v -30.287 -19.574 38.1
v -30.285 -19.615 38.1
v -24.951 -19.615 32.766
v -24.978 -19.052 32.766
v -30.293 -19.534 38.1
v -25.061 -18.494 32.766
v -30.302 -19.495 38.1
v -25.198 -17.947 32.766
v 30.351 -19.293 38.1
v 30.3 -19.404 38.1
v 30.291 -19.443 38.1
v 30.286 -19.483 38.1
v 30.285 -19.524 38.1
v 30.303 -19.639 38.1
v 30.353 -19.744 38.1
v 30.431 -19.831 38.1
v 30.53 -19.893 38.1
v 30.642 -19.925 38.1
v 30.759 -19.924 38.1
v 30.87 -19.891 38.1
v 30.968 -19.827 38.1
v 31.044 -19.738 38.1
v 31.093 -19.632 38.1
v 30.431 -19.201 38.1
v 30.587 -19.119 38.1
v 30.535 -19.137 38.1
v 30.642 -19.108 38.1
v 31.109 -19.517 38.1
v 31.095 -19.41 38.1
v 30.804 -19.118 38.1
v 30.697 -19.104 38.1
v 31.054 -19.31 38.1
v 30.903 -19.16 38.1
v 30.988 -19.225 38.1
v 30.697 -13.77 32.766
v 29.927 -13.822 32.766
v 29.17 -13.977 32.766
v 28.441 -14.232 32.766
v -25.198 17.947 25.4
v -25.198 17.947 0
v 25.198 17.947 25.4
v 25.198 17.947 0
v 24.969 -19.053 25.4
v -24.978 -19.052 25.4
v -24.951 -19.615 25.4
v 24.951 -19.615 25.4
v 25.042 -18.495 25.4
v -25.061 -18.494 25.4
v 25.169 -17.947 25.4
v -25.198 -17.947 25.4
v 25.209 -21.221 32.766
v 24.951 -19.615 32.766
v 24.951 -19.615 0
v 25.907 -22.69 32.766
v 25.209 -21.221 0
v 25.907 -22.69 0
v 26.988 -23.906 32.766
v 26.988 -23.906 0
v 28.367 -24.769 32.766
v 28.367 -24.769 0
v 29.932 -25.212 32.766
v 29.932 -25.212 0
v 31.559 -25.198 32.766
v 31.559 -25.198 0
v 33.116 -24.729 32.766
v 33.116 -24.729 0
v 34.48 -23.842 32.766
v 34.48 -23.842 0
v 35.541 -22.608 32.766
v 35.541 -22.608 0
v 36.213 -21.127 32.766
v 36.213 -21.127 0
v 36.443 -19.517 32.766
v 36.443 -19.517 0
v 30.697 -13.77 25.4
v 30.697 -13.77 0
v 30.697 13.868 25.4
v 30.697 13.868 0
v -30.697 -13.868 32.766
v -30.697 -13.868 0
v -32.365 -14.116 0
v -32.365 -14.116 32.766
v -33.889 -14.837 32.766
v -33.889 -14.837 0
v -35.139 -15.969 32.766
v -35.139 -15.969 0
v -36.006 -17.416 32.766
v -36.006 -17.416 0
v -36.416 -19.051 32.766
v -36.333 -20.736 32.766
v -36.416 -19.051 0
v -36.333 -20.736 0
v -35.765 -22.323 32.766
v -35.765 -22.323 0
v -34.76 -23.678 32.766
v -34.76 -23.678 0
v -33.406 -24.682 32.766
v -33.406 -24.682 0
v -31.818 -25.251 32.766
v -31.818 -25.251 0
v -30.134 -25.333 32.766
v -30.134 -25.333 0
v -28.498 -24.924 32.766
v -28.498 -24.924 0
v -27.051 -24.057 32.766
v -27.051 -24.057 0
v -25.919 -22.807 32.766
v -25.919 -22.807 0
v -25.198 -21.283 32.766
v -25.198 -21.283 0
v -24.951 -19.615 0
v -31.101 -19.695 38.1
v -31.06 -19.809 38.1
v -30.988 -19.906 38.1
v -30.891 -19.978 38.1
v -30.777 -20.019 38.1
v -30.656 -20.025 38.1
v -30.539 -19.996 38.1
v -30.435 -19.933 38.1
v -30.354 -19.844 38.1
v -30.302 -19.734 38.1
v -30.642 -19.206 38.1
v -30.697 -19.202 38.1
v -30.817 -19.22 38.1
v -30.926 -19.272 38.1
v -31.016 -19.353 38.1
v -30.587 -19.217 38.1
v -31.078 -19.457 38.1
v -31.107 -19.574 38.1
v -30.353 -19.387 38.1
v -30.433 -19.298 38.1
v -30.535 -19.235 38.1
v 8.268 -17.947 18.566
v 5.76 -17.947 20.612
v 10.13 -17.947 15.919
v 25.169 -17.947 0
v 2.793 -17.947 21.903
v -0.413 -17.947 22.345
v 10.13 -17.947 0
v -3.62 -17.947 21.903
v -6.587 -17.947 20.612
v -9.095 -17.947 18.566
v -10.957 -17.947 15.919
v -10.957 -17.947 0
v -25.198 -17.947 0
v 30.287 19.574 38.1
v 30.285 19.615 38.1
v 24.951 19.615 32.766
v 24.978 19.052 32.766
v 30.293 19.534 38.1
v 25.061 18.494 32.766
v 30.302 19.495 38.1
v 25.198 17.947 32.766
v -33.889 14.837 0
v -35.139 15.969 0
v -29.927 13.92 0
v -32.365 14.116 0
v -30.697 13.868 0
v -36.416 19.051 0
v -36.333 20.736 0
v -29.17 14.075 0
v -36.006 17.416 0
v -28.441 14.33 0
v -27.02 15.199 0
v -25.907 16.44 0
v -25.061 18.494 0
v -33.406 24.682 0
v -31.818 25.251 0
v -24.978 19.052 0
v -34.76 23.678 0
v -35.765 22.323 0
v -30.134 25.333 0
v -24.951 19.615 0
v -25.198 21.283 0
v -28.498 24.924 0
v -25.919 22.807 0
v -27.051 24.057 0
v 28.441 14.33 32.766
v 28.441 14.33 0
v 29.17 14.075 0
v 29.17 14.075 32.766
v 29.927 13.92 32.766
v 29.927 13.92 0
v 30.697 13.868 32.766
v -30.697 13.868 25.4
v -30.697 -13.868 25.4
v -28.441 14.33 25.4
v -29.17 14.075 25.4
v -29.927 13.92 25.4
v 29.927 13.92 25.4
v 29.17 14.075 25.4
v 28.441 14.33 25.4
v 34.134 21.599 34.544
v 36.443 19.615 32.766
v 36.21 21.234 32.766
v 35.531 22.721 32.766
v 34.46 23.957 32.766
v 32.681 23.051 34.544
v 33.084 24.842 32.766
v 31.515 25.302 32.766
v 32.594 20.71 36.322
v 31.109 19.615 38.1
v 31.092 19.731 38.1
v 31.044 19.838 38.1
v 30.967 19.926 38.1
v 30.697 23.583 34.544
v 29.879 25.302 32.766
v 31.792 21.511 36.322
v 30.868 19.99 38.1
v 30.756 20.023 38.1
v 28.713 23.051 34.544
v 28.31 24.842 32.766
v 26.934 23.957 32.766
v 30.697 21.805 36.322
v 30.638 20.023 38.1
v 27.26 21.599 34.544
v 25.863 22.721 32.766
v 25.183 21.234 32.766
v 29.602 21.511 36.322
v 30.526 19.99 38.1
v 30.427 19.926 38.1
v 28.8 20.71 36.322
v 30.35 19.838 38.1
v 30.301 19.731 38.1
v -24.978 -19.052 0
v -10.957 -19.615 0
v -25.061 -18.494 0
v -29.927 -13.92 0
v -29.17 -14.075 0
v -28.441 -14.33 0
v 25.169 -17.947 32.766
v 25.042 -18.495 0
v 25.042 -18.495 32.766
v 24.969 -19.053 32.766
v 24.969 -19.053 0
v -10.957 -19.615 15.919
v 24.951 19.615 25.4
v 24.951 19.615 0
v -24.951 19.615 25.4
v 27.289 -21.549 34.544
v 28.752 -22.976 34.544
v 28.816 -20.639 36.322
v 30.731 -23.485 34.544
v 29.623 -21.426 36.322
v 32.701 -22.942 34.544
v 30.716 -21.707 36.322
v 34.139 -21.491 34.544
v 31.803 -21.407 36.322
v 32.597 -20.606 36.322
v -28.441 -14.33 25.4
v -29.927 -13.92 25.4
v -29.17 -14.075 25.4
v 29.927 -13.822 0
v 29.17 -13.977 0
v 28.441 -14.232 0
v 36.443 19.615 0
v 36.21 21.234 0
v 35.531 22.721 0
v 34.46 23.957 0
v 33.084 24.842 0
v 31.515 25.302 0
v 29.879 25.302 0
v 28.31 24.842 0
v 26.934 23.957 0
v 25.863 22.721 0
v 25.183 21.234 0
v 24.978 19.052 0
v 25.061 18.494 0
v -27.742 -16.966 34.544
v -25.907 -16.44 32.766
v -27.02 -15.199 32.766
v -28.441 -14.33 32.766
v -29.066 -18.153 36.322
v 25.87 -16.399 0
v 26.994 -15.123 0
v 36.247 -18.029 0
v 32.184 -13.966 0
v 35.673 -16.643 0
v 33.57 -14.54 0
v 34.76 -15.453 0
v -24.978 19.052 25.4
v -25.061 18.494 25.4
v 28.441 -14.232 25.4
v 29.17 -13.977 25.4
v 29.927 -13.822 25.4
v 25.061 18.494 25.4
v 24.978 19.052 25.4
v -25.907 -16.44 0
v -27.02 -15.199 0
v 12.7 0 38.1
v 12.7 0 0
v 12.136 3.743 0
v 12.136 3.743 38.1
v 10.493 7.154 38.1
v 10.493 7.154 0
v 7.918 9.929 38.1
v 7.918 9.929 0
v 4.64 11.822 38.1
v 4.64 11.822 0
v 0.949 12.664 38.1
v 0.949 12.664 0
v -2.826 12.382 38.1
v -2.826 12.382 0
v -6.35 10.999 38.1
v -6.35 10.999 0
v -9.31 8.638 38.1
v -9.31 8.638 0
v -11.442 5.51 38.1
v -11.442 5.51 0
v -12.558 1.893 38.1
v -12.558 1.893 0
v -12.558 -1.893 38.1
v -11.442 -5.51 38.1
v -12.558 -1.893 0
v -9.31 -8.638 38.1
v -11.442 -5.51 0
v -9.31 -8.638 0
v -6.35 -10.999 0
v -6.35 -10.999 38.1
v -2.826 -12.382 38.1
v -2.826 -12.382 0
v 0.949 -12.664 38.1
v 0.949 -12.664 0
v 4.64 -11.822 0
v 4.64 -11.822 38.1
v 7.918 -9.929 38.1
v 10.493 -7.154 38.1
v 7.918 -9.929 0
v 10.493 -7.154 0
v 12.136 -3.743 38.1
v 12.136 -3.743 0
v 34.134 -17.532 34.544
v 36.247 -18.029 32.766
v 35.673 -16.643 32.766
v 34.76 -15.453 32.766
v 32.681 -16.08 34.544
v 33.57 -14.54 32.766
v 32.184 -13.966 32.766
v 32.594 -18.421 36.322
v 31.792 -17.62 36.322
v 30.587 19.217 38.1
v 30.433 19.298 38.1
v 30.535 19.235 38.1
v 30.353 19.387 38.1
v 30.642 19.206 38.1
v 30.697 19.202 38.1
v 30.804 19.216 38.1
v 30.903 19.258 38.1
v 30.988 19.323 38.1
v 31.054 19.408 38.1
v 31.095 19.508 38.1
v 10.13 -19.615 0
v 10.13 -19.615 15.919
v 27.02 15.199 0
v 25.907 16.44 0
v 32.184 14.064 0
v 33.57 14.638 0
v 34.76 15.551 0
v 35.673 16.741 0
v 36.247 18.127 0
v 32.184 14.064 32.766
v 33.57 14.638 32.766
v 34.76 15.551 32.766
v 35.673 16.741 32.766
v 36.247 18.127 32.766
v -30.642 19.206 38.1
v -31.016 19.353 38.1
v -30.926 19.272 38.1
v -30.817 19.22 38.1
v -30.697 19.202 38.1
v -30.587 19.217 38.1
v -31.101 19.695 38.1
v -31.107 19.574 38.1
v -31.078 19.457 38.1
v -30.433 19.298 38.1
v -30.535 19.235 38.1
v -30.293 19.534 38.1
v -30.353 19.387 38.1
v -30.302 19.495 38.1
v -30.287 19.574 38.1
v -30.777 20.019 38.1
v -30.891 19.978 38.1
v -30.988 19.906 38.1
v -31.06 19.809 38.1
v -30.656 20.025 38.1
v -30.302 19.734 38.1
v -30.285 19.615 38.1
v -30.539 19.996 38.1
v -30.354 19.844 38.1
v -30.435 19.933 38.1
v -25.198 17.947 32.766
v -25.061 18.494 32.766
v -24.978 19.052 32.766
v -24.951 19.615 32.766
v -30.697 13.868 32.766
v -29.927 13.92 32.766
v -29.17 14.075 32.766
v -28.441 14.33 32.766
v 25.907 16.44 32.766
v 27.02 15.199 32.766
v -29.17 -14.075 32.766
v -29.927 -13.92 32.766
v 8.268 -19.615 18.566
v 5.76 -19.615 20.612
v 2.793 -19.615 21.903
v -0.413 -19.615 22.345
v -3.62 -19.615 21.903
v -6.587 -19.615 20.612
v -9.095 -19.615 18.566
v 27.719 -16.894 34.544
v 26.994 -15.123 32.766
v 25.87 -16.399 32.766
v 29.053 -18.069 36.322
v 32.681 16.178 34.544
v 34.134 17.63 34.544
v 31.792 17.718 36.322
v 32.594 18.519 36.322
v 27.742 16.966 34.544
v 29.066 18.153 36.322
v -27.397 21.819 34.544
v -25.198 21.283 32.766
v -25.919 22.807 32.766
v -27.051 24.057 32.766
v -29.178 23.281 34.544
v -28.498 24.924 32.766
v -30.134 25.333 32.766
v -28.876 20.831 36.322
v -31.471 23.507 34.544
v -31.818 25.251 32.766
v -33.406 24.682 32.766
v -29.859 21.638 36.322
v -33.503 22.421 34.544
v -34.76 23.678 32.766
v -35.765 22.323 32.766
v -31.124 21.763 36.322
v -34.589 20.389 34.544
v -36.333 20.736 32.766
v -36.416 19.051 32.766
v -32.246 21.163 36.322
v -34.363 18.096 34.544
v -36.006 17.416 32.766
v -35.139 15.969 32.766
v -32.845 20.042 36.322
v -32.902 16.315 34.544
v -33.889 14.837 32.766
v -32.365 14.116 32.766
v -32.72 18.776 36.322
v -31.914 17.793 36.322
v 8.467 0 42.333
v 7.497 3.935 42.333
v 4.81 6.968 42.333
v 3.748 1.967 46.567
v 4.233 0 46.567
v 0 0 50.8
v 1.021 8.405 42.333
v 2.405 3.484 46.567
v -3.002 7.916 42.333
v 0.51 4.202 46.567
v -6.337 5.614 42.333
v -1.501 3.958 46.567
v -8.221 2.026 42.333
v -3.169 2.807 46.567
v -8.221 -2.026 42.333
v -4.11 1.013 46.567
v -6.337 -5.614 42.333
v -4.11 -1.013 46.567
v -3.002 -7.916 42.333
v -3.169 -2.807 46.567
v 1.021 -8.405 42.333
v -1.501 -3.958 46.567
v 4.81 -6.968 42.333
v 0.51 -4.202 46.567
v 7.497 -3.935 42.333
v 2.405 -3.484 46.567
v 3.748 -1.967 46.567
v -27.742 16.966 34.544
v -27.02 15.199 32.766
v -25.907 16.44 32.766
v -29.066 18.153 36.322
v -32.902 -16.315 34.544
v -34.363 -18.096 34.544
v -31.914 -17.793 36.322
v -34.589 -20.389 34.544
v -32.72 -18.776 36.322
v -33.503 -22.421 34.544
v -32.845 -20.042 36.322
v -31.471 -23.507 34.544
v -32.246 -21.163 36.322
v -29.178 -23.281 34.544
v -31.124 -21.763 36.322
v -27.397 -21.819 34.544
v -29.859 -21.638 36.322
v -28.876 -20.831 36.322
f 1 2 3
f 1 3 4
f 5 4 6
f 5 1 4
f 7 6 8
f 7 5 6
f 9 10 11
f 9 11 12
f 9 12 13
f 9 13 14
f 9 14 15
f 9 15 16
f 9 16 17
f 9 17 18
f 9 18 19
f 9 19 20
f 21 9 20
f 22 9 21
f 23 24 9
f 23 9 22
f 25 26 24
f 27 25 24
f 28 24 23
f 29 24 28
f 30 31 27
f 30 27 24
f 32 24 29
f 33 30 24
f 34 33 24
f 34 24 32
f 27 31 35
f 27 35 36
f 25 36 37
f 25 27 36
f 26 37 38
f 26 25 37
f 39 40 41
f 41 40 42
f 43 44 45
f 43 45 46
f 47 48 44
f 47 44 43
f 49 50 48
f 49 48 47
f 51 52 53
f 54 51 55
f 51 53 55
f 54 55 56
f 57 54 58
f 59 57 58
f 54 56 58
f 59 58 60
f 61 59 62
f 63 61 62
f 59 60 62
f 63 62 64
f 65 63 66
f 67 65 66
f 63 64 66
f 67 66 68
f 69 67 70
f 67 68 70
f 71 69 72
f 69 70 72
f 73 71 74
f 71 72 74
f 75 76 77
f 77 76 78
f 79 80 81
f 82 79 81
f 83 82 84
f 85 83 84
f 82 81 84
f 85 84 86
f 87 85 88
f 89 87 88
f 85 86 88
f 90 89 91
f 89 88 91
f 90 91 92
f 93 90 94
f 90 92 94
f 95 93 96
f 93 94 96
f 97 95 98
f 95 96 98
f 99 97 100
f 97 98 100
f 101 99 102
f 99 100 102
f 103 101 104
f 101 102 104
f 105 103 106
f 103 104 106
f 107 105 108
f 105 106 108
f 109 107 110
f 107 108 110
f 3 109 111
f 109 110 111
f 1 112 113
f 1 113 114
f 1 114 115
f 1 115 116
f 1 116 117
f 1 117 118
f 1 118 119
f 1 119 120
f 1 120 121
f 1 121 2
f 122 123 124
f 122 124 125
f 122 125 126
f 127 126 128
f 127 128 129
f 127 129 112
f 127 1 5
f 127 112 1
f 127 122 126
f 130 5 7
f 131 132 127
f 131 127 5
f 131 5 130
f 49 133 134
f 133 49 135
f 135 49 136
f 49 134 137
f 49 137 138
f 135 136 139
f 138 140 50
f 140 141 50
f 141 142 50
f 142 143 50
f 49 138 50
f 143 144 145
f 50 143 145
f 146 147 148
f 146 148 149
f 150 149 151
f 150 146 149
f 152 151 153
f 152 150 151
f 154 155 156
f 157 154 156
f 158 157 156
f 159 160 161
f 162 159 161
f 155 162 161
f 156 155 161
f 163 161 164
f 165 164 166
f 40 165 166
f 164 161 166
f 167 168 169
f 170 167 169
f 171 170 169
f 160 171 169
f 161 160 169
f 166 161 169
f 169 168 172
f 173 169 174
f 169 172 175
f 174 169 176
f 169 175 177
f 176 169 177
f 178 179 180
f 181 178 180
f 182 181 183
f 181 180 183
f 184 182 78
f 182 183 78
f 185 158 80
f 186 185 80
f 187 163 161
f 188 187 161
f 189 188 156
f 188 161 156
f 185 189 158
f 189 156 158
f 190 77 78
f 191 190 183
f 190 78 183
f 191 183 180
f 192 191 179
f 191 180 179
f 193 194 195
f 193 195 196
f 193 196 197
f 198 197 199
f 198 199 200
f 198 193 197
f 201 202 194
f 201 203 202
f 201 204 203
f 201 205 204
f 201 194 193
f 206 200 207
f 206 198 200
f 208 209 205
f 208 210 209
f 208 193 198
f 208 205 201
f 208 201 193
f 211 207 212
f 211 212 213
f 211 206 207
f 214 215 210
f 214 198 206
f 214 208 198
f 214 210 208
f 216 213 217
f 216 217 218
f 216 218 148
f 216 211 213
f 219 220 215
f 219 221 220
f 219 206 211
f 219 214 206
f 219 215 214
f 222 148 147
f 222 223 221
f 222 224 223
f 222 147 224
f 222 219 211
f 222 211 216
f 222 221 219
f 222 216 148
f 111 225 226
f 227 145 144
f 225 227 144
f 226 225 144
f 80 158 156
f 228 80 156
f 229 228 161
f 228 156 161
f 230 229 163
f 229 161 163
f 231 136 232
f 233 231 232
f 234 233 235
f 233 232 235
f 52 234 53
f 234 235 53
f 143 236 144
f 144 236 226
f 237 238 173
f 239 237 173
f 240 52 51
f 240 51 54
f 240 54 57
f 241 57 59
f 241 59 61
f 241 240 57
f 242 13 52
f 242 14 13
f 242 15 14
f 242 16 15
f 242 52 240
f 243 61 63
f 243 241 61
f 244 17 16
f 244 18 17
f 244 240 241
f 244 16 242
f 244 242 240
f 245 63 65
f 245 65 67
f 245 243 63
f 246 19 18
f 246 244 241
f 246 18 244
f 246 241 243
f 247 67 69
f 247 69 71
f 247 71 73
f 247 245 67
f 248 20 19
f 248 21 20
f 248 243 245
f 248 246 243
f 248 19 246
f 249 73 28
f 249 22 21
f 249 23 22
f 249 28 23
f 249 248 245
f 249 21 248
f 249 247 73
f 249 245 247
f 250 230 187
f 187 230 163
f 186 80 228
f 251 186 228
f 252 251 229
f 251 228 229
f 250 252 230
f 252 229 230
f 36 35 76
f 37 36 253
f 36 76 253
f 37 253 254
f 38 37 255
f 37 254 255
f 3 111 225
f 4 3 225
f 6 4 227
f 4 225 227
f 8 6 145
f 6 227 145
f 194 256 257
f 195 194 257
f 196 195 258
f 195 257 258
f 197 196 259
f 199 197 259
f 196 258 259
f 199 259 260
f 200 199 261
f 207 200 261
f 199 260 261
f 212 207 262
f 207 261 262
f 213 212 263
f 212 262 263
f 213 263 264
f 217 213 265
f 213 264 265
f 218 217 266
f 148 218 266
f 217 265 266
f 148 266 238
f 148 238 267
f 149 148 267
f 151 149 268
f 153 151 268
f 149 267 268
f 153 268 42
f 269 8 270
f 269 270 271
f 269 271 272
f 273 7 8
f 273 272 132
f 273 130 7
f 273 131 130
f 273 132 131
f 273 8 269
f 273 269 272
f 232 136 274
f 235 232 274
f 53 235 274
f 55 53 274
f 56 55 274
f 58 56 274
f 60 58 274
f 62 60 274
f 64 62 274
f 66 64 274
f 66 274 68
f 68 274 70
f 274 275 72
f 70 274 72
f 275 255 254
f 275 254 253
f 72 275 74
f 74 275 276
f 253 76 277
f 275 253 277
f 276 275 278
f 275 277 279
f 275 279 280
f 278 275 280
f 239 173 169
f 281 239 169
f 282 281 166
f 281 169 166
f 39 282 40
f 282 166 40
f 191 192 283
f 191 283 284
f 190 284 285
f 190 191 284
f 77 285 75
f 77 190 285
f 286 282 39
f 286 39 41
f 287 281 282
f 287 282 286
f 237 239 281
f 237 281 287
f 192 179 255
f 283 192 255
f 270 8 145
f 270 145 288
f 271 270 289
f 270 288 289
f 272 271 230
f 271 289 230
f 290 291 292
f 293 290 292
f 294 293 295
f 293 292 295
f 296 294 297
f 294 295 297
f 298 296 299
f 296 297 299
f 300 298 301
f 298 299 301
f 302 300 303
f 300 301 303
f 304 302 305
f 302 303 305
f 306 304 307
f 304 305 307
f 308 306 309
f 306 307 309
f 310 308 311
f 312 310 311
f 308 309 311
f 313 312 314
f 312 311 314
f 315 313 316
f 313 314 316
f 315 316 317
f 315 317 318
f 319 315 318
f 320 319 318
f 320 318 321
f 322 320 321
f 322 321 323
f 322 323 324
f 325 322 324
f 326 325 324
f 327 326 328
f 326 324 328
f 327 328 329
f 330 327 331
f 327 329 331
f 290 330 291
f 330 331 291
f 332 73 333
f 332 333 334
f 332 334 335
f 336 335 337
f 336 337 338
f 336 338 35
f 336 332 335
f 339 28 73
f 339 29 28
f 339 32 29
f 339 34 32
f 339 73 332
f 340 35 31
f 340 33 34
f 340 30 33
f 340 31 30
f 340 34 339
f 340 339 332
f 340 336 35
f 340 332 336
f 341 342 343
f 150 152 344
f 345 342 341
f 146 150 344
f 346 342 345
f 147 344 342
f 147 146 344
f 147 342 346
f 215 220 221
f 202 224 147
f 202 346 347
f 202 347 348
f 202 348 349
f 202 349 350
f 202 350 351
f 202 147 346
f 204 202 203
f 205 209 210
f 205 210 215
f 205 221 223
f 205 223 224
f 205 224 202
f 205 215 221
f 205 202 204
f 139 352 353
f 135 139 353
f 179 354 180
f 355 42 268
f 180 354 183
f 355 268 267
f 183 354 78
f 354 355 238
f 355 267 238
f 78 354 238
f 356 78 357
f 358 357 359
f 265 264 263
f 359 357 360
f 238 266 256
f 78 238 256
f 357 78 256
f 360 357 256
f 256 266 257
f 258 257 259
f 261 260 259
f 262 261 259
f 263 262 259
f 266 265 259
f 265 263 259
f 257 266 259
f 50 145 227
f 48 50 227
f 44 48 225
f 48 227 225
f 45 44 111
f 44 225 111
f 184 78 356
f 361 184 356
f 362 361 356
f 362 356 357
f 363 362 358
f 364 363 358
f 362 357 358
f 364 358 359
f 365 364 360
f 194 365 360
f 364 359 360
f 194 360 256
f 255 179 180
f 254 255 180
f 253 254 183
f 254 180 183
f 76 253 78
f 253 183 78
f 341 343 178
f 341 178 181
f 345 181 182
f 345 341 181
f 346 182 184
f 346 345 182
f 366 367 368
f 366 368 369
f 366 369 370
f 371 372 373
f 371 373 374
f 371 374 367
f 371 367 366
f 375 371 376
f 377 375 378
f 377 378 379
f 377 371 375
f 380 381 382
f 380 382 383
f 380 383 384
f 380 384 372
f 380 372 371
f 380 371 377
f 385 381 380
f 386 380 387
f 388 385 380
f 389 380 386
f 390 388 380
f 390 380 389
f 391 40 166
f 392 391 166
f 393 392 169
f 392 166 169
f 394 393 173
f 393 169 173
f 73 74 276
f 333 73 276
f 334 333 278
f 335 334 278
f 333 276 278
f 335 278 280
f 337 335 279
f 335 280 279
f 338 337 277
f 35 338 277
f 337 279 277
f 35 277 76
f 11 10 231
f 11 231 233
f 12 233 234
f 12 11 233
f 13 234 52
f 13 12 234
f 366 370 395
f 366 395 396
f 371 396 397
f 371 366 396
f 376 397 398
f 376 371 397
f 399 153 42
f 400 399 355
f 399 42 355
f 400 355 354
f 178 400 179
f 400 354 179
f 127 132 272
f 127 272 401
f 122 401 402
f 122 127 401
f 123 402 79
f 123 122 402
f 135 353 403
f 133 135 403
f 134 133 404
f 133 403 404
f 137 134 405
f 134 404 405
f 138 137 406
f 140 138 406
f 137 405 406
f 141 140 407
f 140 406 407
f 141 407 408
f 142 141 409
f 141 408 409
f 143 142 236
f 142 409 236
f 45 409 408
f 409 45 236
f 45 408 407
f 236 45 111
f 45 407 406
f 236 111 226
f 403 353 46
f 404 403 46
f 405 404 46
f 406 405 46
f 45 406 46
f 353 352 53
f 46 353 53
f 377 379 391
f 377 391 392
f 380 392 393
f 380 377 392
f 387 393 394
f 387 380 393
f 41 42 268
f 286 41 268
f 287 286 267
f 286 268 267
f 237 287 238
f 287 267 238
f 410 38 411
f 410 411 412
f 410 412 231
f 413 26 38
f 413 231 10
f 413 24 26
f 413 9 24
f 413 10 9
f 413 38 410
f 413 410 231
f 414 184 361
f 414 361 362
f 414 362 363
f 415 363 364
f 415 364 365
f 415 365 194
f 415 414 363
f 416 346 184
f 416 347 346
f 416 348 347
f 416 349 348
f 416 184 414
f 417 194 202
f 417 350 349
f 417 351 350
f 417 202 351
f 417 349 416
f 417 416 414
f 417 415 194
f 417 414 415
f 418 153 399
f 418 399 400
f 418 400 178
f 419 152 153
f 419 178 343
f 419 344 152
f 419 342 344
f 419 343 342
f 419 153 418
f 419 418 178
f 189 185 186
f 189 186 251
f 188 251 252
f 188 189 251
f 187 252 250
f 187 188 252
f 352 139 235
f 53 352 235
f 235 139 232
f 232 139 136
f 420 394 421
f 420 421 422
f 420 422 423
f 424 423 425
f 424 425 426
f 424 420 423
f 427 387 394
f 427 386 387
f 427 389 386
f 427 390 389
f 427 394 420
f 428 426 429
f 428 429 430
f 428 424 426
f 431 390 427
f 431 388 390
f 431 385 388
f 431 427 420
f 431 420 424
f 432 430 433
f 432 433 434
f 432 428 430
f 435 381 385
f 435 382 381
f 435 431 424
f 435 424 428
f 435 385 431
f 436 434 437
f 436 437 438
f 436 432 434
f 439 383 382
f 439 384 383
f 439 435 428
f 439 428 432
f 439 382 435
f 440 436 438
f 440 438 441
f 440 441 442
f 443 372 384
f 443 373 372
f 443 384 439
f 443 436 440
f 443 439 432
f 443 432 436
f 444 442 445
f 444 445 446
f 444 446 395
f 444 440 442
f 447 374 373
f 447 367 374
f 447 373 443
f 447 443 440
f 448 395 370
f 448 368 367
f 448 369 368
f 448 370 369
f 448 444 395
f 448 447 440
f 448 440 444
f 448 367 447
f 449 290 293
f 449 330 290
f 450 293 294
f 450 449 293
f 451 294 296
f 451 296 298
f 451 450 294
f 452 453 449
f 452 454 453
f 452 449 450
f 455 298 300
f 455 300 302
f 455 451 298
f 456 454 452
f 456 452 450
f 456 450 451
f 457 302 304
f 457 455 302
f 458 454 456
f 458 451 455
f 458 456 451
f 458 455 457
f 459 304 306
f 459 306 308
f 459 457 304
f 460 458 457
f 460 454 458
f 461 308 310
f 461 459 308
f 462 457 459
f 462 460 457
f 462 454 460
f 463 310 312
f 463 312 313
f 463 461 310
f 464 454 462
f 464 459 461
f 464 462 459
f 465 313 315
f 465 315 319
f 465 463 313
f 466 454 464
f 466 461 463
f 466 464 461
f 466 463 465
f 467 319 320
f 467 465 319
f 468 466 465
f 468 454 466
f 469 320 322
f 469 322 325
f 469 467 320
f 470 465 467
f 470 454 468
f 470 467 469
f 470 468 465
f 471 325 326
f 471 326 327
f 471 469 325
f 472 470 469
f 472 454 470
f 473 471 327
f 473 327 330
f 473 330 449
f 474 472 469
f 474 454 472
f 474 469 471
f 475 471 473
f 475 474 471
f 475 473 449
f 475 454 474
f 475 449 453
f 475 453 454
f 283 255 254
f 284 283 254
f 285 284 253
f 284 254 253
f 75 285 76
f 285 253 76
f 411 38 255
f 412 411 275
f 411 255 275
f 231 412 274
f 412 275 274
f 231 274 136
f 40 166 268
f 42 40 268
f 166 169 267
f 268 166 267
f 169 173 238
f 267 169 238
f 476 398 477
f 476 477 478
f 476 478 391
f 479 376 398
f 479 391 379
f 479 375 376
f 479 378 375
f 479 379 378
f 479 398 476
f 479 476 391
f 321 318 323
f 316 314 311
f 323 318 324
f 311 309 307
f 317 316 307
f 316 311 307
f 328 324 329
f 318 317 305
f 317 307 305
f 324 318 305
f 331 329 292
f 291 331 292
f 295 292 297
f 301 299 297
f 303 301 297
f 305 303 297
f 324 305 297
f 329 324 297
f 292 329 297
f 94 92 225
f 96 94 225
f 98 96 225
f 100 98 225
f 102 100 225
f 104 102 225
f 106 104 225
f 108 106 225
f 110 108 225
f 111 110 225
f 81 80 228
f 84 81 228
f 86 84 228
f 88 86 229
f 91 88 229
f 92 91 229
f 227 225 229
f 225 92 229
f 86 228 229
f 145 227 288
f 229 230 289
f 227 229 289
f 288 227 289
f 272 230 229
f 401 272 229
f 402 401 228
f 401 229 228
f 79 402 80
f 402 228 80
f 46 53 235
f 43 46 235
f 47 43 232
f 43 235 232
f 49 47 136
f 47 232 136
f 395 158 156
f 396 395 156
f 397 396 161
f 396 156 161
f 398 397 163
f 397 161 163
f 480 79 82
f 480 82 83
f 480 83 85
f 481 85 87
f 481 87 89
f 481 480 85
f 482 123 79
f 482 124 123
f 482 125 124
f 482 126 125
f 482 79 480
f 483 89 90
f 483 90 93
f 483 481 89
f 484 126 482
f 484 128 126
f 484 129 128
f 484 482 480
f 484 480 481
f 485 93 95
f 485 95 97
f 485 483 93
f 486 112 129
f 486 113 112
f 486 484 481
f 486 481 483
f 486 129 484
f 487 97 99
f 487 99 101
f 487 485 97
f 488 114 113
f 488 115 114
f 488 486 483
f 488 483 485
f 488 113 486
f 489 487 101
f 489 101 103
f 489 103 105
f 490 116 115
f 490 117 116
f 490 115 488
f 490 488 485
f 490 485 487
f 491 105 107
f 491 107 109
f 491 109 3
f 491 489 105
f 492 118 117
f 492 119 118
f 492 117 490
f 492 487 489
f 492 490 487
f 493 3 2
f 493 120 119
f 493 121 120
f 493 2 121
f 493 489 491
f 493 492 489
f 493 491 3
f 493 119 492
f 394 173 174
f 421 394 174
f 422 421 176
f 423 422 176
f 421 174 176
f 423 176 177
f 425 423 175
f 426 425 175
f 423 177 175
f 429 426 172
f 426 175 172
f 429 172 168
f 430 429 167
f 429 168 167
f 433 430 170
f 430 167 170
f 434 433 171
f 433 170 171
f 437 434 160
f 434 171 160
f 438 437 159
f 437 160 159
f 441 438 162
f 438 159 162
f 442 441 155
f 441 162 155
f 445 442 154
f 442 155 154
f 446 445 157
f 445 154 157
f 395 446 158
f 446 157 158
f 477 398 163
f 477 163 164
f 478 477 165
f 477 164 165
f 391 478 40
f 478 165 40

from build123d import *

# Parameters (mm, degrees)
F1_DEPTH  = 25.4
F2_DEPTH  = 38.1
F0_R      = 12.7
F3_DEPTH  = 50.8
F5_DEPTH  = 25.4
F6_SIZE   = 12.7
F7_SIZE   = 5.334
F7_2_SIZE = 5.334
F7_3_SIZE = 5.334
F7_4_SIZE = 5.334


# Not quite as in the source:
# - a feature names something its author has since deleted; it is built from what else it names


with BuildPart() as f1:
    # F0 (on Top) → F1 (new body)
    with BuildSketch(Plane.XY):
        with BuildLine():
            Line((24.9506174104, 19.6146306736), (-24.950613876, 19.6146306736))
            ThreePointArc((-24.950613876, 19.6146306736), (-25.0127463025, 18.7718966911), (-25.1977999521, 17.9473870487))
            Line((-25.1977999521, 17.9473870487), (25.1978040222, 17.9473870487))
            ThreePointArc((25.1978040222, 17.9473870487), (25.0127501018, 18.771896671), (24.9506174104, 19.6146306736))
        make_face()
    extrude(amount=F1_DEPTH)


with BuildPart() as f1b:
    # F0 (on Top) → F1, piece 2 (new body)
    with BuildSketch(Plane.XY):
        with BuildLine():
            Line((-30.6968968099, 13.8683477398), (-30.6968968099, -13.8683477398))
            ThreePointArc((-30.6968968099, -13.8683477398), (-29.54571818, -13.9848389086), (-28.4412139466, -14.3295892948))
            Line((-28.4412139466, -14.3295892948), (-28.4412139466, 14.3295892948))
            ThreePointArc((-28.4412139466, 14.3295892948), (-29.54571818, 13.9848389086), (-30.6968968099, 13.8683477398))
        make_face()
    extrude(amount=F1_DEPTH)


with BuildPart() as f1c:
    # F0 (on Top) → F1, piece 3 (new body)
    with BuildSketch(Plane.XY):
        with BuildLine():
            ThreePointArc((-25.1977999521, -17.9473870487), (-25.0127463025, -18.7718966911), (-24.950613876, -19.6146306736))
            Line((-24.950613876, -19.6146306736), (24.9514508717, -19.6146306736))
            ThreePointArc((24.9514508717, -19.6146306736), (24.9989231754, -18.7730083224), (25.1690152512, -17.9473870487))
            Line((25.1690152512, -17.9473870487), (-25.1977999521, -17.9473870487))
        make_face()
    extrude(amount=F1_DEPTH)

    # F4 (on face) → F5 (cut)
    with BuildSketch(Plane.XZ.offset(19.6146306736)):
        with BuildLine():
            Line((-10.9574375674, 15.9193035215), (-10.9574375674, 0))
            Line((-10.9574375674, 0), (10.130468756, 0))
            Line((10.130468756, 0), (10.130468756, 15.9193035215))
            ThreePointArc((10.130468756, 15.9193035215), (-0.4134844057, 22.3445965305), (-10.9574375674, 15.9193035215))
        make_face()
    extrude(amount=-F5_DEPTH, mode=Mode.SUBTRACT)


with BuildPart() as f1d:
    # F0 (on Top) → F1, piece 4 (new body)
    with BuildSketch(Plane.XY):
        with BuildLine():
            Line((28.4412139466, 14.3295925704), (28.4412139466, -14.2315152048))
            ThreePointArc((28.4412139466, -14.2315152048), (29.54571818, -13.8867648186), (30.6968968099, -13.7702736498))
            Line((30.6968968099, -13.7702736498), (30.6968968099, 13.868349507))
            ThreePointArc((30.6968968099, 13.868349507), (29.5457181005, 13.9848414147), (28.4412139466, 14.3295925704))
        make_face()
    extrude(amount=F1_DEPTH)


with BuildPart() as f2:
    # F0 (on Top) → F2 (new body)
    with BuildSketch(Plane.XY):
        with BuildLine():
            ThreePointArc((-24.950613876, 19.6146306736), (-34.760132439, 23.6778663028), (-30.6968968099, 13.8683477398))
            ThreePointArc((-30.6968968099, 13.8683477398), (-29.54571818, 13.9848389086), (-28.4412139466, 14.3295892948))
            ThreePointArc((-28.4412139466, 14.3295892948), (-26.4183144188, 15.778812602), (-25.1977999521, 17.9473870487))
            ThreePointArc((-25.1977999521, 17.9473870487), (-25.0127463025, 18.7718966911), (-24.950613876, 19.6146306736))
        make_face()
    extrude(amount=F2_DEPTH)

    # F7
    f7_edges = [f2.edges().sort_by_distance(p)[0] for p in [
        (-30.696897, 25.360914, 38.1),
    ]]
    chamfer(f7_edges, length=F7_SIZE)


with BuildPart() as f2b:
    # F0 (on Top) → F2, piece 2 (new body)
    with BuildSketch(Plane.XY):
        with BuildLine():
            ThreePointArc((25.1978040222, 17.9473870487), (26.4183172869, 15.7788151124), (28.4412139466, 14.3295925704))
            ThreePointArc((28.4412139466, 14.3295925704), (29.5457181005, 13.9848414147), (30.6968968099, 13.868349507))
            ThreePointArc((30.6968968099, 13.868349507), (34.7601347238, 15.5513955621), (36.4431832781, 19.6146324408))
            ThreePointArc((36.4431832781, 19.6146324408), (30.6968994606, 25.3609153747), (24.9506174104, 19.6146306736))
            ThreePointArc((24.9506174104, 19.6146306736), (25.0127501018, 18.771896671), (25.1978040222, 17.9473870487))
        make_face()
    extrude(amount=F2_DEPTH)

    # F7#2
    f7_2_edges = [f2b.edges().sort_by_distance(p)[0] for p in [
        (36.443183, 19.614634, 38.1),
    ]]
    chamfer(f7_2_edges, length=F7_2_SIZE)


with BuildPart() as f2c:
    # F0 (on Top) → F2, piece 3 (new body)
    with BuildSketch(Plane.XY):
        with BuildLine():
            ThreePointArc((-30.6968968099, -13.8683477398), (-34.760132439, -23.6778663028), (-24.950613876, -19.6146306736))
            ThreePointArc((-24.950613876, -19.6146306736), (-25.0127463025, -18.7718966911), (-25.1977999521, -17.9473870487))
            ThreePointArc((-25.1977999521, -17.9473870487), (-26.4183144188, -15.778812602), (-28.4412139466, -14.3295892948))
            ThreePointArc((-28.4412139466, -14.3295892948), (-29.54571818, -13.9848389086), (-30.6968968099, -13.8683477398))
        make_face()
    extrude(amount=F2_DEPTH)

    # F7#3
    f7_3_edges = [f2c.edges().sort_by_distance(p)[0] for p in [
        (-36.44318, -19.614631, 38.1),
    ]]
    chamfer(f7_3_edges, length=F7_3_SIZE)


with BuildPart() as f2d:
    # F0 (on Top) → F2, piece 4 (new body)
    with BuildSketch(Plane.XY):
        with BuildLine():
            ThreePointArc((25.1690152512, -17.9473870487), (24.9989231754, -18.7730083224), (24.9514508717, -19.6146306736))
            ThreePointArc((24.9514508717, -19.6146306736), (30.7459356406, -25.2626302648), (36.4431797437, -19.5165565837))
            ThreePointArc((36.4431797437, -19.5165565837), (34.760132439, -15.4533209545), (30.6968968099, -13.7702736498))
            ThreePointArc((30.6968968099, -13.7702736498), (29.54571818, -13.8867648186), (28.4412139466, -14.2315152048))
            ThreePointArc((28.4412139466, -14.2315152048), (26.3843691674, -15.718942479), (25.1690152512, -17.9473870487))
        make_face()
    extrude(amount=F2_DEPTH)

    # F7#4
    f7_4_edges = [f2d.edges().sort_by_distance(p)[0] for p in [
        (36.442343, -19.418482, 38.1),
    ]]
    chamfer(f7_4_edges, length=F7_4_SIZE)


with BuildPart() as f3:
    # F0 (on Top) → F3 (new body)
    with BuildSketch(Plane.XY):
        Circle(F0_R)
    extrude(amount=F3_DEPTH)

    # F6
    f6_edges = [f3.edges().sort_by_distance(p)[0] for p in [
        (-12.7, 0, 50.8),
    ]]
    chamfer(f6_edges, length=F6_SIZE)


solid = Compound([f1.part, f1b.part, f1c.part, f1d.part, f2.part, f2b.part, f2c.part, f2d.part, f3.part])
